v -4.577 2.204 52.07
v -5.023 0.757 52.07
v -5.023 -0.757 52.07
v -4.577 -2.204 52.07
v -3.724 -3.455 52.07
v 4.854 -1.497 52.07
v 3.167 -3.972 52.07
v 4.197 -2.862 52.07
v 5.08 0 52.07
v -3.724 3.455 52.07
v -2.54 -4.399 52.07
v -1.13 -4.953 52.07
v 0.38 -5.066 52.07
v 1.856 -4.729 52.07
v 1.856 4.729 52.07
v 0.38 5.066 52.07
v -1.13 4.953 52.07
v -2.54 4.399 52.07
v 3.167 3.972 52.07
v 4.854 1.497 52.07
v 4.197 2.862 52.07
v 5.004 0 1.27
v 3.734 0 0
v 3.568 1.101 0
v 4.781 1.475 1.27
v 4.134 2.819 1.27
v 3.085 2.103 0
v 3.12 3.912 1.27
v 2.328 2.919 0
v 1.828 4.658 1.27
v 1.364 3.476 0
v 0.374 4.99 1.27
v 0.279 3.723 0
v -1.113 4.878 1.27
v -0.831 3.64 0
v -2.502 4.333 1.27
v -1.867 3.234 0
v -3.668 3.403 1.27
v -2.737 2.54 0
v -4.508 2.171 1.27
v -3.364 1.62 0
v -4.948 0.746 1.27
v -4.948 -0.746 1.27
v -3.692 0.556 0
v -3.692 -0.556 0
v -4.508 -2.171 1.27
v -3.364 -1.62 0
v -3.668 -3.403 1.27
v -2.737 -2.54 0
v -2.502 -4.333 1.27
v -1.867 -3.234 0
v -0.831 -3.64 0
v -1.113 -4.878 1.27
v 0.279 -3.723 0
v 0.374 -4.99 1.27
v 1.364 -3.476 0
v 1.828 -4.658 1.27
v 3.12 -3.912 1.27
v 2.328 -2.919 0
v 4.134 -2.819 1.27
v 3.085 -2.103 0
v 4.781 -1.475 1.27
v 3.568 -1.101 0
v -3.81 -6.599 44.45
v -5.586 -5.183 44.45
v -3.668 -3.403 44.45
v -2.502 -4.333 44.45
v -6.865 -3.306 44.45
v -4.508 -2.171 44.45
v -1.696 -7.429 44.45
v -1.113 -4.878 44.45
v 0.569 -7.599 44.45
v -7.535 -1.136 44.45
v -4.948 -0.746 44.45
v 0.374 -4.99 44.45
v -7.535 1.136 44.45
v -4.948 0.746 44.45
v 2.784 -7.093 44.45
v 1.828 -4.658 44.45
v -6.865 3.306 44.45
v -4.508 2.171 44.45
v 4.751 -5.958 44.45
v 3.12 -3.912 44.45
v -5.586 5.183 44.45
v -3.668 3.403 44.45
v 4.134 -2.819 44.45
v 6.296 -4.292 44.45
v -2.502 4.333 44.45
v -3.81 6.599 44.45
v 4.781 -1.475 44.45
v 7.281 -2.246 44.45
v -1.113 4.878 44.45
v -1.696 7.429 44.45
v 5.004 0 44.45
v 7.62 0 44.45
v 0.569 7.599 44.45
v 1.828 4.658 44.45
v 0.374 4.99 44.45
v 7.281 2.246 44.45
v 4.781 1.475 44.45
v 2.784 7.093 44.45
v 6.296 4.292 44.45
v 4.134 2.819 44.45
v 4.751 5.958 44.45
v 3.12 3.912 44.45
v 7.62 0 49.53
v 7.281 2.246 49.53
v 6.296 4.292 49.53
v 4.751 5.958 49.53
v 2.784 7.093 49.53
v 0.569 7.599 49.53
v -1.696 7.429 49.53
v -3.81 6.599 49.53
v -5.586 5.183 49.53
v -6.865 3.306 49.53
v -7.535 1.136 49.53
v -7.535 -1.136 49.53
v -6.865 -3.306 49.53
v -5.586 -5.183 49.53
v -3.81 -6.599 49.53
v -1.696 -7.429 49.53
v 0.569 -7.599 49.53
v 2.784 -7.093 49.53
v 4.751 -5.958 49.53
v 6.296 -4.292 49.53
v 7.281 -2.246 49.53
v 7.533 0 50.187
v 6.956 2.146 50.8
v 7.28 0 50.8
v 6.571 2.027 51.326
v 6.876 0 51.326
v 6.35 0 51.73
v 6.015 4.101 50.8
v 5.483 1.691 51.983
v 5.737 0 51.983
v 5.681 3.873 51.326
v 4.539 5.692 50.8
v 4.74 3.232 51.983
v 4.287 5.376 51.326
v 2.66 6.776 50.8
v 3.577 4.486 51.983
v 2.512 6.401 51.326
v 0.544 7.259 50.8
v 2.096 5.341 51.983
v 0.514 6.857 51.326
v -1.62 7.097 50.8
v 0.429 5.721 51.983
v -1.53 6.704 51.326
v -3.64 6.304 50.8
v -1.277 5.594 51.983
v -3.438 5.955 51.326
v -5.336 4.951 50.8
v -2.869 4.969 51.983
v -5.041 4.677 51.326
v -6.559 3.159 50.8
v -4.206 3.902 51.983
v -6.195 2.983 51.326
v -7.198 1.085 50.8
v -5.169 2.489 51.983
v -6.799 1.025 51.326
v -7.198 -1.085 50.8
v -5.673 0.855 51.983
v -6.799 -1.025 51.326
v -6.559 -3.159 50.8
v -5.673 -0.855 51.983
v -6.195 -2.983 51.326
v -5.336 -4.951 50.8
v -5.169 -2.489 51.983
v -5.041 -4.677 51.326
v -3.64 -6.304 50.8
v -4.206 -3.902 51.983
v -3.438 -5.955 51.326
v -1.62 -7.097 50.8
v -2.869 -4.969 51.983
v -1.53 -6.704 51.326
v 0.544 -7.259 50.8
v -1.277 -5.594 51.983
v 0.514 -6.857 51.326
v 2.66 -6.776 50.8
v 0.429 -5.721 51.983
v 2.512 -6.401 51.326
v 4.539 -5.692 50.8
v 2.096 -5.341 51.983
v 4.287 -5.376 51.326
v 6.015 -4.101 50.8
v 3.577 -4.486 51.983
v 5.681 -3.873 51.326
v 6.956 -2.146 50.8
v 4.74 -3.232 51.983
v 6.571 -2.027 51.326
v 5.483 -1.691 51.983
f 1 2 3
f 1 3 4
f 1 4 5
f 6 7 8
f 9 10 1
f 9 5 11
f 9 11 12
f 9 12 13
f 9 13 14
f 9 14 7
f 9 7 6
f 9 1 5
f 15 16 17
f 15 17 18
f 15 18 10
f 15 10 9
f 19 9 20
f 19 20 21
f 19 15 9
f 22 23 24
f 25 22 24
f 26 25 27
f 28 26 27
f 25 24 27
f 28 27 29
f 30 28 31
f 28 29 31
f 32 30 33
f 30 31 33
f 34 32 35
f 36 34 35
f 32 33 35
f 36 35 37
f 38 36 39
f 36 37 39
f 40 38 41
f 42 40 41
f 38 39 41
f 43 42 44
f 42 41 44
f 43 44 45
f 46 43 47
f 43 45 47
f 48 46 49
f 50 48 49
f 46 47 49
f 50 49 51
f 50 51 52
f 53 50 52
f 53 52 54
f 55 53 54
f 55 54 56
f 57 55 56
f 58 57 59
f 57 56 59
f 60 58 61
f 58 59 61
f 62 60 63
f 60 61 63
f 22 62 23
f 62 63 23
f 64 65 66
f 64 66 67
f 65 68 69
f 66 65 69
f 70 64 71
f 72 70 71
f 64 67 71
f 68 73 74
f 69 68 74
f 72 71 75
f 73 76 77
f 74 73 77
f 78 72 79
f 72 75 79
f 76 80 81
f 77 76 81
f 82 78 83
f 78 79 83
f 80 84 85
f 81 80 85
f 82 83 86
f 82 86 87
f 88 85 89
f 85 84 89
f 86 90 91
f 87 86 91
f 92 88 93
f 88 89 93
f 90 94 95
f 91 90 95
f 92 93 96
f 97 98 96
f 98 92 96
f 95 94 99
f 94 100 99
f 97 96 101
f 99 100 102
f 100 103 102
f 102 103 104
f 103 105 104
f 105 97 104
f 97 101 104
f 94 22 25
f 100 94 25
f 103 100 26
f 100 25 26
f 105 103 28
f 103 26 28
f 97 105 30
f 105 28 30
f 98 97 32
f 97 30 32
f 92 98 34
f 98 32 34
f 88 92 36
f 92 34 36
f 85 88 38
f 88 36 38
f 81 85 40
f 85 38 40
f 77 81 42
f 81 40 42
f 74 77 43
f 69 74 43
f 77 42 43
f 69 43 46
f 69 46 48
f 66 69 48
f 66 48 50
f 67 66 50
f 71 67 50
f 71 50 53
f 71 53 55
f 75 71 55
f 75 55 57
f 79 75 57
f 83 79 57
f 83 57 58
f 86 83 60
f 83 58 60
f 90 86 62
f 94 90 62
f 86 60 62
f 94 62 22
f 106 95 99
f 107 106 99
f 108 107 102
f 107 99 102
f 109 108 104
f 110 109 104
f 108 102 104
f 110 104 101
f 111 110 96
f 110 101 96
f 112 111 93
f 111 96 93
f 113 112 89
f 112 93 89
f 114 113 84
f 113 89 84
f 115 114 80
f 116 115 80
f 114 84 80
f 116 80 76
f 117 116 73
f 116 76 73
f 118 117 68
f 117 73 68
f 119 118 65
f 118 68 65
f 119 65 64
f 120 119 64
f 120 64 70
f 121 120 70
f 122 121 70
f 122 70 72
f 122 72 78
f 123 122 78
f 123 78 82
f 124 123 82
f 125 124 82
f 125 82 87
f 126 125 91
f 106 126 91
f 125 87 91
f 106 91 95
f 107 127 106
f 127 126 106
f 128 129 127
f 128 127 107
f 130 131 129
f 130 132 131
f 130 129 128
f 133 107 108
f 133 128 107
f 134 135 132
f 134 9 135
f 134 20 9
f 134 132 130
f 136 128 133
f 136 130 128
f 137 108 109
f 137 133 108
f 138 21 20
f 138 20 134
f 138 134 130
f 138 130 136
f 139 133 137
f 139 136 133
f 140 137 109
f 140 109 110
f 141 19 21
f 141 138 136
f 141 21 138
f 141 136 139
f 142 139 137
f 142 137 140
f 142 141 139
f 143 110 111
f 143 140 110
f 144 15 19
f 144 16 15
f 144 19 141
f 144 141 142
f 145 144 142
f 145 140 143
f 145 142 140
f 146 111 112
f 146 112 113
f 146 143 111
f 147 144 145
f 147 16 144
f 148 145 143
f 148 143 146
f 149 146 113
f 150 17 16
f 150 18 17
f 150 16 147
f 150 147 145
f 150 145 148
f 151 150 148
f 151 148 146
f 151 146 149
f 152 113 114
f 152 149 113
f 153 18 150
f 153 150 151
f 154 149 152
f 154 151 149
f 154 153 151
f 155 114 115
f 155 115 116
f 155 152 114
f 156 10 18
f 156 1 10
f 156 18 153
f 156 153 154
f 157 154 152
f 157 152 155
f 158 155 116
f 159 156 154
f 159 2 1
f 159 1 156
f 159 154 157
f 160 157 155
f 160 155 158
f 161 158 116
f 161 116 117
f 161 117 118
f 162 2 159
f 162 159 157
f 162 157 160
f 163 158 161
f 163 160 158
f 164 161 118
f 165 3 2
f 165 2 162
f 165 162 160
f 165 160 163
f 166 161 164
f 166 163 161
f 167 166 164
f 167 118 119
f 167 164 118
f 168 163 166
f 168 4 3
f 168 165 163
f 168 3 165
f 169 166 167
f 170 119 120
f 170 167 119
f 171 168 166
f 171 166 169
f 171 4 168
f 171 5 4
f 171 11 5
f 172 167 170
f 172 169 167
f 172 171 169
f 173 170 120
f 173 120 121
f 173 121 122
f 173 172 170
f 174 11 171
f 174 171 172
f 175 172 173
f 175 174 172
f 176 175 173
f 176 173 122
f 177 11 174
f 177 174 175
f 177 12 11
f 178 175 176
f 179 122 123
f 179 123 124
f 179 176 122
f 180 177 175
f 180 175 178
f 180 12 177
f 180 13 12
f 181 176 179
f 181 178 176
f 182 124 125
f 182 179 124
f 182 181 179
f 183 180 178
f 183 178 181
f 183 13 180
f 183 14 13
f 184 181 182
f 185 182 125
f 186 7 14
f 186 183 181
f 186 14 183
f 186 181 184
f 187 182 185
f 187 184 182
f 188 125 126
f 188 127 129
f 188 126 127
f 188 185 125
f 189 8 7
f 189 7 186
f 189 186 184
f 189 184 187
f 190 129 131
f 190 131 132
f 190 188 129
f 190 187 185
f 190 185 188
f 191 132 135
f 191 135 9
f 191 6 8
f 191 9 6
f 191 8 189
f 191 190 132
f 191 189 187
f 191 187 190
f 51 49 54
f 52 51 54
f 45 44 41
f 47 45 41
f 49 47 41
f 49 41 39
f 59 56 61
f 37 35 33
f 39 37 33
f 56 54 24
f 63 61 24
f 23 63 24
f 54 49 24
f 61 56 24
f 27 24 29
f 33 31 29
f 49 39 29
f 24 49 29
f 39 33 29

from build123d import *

# Parameters (mm, degrees)
F0_R     = 5.0038
F1_DEPTH = 44.45
F2_R     = 7.62
F2_R_2   = 5.0038
F3_DEPTH = 7.62
F4_R     = 2.54
F5_SIZE  = 1.27


with BuildPart() as f1:
    # F0 (on Top) → F1 (new body)
    with BuildSketch(Plane.XY):
        Circle(F0_R)
    extrude(amount=F1_DEPTH)

    # F2 (on face) → F3 (join)
    with BuildSketch(Plane.XY.offset(44.45)):
        Circle(F2_R)
        Circle(F2_R_2, mode=Mode.SUBTRACT)
        Circle(F2_R_2)
    extrude(amount=F3_DEPTH)

    # F4
    f4_edges = [f1.edges().sort_by_distance(p)[0] for p in [
        (-7.62, 0, 52.07),
    ]]
    fillet(f4_edges, radius=F4_R)

    # F5
    f5_edges = [f1.edges().sort_by_distance(p)[0] for p in [
        (-5.0038, 0, 0),
    ]]
    chamfer(f5_edges, length=F5_SIZE)


solid = f1.part
